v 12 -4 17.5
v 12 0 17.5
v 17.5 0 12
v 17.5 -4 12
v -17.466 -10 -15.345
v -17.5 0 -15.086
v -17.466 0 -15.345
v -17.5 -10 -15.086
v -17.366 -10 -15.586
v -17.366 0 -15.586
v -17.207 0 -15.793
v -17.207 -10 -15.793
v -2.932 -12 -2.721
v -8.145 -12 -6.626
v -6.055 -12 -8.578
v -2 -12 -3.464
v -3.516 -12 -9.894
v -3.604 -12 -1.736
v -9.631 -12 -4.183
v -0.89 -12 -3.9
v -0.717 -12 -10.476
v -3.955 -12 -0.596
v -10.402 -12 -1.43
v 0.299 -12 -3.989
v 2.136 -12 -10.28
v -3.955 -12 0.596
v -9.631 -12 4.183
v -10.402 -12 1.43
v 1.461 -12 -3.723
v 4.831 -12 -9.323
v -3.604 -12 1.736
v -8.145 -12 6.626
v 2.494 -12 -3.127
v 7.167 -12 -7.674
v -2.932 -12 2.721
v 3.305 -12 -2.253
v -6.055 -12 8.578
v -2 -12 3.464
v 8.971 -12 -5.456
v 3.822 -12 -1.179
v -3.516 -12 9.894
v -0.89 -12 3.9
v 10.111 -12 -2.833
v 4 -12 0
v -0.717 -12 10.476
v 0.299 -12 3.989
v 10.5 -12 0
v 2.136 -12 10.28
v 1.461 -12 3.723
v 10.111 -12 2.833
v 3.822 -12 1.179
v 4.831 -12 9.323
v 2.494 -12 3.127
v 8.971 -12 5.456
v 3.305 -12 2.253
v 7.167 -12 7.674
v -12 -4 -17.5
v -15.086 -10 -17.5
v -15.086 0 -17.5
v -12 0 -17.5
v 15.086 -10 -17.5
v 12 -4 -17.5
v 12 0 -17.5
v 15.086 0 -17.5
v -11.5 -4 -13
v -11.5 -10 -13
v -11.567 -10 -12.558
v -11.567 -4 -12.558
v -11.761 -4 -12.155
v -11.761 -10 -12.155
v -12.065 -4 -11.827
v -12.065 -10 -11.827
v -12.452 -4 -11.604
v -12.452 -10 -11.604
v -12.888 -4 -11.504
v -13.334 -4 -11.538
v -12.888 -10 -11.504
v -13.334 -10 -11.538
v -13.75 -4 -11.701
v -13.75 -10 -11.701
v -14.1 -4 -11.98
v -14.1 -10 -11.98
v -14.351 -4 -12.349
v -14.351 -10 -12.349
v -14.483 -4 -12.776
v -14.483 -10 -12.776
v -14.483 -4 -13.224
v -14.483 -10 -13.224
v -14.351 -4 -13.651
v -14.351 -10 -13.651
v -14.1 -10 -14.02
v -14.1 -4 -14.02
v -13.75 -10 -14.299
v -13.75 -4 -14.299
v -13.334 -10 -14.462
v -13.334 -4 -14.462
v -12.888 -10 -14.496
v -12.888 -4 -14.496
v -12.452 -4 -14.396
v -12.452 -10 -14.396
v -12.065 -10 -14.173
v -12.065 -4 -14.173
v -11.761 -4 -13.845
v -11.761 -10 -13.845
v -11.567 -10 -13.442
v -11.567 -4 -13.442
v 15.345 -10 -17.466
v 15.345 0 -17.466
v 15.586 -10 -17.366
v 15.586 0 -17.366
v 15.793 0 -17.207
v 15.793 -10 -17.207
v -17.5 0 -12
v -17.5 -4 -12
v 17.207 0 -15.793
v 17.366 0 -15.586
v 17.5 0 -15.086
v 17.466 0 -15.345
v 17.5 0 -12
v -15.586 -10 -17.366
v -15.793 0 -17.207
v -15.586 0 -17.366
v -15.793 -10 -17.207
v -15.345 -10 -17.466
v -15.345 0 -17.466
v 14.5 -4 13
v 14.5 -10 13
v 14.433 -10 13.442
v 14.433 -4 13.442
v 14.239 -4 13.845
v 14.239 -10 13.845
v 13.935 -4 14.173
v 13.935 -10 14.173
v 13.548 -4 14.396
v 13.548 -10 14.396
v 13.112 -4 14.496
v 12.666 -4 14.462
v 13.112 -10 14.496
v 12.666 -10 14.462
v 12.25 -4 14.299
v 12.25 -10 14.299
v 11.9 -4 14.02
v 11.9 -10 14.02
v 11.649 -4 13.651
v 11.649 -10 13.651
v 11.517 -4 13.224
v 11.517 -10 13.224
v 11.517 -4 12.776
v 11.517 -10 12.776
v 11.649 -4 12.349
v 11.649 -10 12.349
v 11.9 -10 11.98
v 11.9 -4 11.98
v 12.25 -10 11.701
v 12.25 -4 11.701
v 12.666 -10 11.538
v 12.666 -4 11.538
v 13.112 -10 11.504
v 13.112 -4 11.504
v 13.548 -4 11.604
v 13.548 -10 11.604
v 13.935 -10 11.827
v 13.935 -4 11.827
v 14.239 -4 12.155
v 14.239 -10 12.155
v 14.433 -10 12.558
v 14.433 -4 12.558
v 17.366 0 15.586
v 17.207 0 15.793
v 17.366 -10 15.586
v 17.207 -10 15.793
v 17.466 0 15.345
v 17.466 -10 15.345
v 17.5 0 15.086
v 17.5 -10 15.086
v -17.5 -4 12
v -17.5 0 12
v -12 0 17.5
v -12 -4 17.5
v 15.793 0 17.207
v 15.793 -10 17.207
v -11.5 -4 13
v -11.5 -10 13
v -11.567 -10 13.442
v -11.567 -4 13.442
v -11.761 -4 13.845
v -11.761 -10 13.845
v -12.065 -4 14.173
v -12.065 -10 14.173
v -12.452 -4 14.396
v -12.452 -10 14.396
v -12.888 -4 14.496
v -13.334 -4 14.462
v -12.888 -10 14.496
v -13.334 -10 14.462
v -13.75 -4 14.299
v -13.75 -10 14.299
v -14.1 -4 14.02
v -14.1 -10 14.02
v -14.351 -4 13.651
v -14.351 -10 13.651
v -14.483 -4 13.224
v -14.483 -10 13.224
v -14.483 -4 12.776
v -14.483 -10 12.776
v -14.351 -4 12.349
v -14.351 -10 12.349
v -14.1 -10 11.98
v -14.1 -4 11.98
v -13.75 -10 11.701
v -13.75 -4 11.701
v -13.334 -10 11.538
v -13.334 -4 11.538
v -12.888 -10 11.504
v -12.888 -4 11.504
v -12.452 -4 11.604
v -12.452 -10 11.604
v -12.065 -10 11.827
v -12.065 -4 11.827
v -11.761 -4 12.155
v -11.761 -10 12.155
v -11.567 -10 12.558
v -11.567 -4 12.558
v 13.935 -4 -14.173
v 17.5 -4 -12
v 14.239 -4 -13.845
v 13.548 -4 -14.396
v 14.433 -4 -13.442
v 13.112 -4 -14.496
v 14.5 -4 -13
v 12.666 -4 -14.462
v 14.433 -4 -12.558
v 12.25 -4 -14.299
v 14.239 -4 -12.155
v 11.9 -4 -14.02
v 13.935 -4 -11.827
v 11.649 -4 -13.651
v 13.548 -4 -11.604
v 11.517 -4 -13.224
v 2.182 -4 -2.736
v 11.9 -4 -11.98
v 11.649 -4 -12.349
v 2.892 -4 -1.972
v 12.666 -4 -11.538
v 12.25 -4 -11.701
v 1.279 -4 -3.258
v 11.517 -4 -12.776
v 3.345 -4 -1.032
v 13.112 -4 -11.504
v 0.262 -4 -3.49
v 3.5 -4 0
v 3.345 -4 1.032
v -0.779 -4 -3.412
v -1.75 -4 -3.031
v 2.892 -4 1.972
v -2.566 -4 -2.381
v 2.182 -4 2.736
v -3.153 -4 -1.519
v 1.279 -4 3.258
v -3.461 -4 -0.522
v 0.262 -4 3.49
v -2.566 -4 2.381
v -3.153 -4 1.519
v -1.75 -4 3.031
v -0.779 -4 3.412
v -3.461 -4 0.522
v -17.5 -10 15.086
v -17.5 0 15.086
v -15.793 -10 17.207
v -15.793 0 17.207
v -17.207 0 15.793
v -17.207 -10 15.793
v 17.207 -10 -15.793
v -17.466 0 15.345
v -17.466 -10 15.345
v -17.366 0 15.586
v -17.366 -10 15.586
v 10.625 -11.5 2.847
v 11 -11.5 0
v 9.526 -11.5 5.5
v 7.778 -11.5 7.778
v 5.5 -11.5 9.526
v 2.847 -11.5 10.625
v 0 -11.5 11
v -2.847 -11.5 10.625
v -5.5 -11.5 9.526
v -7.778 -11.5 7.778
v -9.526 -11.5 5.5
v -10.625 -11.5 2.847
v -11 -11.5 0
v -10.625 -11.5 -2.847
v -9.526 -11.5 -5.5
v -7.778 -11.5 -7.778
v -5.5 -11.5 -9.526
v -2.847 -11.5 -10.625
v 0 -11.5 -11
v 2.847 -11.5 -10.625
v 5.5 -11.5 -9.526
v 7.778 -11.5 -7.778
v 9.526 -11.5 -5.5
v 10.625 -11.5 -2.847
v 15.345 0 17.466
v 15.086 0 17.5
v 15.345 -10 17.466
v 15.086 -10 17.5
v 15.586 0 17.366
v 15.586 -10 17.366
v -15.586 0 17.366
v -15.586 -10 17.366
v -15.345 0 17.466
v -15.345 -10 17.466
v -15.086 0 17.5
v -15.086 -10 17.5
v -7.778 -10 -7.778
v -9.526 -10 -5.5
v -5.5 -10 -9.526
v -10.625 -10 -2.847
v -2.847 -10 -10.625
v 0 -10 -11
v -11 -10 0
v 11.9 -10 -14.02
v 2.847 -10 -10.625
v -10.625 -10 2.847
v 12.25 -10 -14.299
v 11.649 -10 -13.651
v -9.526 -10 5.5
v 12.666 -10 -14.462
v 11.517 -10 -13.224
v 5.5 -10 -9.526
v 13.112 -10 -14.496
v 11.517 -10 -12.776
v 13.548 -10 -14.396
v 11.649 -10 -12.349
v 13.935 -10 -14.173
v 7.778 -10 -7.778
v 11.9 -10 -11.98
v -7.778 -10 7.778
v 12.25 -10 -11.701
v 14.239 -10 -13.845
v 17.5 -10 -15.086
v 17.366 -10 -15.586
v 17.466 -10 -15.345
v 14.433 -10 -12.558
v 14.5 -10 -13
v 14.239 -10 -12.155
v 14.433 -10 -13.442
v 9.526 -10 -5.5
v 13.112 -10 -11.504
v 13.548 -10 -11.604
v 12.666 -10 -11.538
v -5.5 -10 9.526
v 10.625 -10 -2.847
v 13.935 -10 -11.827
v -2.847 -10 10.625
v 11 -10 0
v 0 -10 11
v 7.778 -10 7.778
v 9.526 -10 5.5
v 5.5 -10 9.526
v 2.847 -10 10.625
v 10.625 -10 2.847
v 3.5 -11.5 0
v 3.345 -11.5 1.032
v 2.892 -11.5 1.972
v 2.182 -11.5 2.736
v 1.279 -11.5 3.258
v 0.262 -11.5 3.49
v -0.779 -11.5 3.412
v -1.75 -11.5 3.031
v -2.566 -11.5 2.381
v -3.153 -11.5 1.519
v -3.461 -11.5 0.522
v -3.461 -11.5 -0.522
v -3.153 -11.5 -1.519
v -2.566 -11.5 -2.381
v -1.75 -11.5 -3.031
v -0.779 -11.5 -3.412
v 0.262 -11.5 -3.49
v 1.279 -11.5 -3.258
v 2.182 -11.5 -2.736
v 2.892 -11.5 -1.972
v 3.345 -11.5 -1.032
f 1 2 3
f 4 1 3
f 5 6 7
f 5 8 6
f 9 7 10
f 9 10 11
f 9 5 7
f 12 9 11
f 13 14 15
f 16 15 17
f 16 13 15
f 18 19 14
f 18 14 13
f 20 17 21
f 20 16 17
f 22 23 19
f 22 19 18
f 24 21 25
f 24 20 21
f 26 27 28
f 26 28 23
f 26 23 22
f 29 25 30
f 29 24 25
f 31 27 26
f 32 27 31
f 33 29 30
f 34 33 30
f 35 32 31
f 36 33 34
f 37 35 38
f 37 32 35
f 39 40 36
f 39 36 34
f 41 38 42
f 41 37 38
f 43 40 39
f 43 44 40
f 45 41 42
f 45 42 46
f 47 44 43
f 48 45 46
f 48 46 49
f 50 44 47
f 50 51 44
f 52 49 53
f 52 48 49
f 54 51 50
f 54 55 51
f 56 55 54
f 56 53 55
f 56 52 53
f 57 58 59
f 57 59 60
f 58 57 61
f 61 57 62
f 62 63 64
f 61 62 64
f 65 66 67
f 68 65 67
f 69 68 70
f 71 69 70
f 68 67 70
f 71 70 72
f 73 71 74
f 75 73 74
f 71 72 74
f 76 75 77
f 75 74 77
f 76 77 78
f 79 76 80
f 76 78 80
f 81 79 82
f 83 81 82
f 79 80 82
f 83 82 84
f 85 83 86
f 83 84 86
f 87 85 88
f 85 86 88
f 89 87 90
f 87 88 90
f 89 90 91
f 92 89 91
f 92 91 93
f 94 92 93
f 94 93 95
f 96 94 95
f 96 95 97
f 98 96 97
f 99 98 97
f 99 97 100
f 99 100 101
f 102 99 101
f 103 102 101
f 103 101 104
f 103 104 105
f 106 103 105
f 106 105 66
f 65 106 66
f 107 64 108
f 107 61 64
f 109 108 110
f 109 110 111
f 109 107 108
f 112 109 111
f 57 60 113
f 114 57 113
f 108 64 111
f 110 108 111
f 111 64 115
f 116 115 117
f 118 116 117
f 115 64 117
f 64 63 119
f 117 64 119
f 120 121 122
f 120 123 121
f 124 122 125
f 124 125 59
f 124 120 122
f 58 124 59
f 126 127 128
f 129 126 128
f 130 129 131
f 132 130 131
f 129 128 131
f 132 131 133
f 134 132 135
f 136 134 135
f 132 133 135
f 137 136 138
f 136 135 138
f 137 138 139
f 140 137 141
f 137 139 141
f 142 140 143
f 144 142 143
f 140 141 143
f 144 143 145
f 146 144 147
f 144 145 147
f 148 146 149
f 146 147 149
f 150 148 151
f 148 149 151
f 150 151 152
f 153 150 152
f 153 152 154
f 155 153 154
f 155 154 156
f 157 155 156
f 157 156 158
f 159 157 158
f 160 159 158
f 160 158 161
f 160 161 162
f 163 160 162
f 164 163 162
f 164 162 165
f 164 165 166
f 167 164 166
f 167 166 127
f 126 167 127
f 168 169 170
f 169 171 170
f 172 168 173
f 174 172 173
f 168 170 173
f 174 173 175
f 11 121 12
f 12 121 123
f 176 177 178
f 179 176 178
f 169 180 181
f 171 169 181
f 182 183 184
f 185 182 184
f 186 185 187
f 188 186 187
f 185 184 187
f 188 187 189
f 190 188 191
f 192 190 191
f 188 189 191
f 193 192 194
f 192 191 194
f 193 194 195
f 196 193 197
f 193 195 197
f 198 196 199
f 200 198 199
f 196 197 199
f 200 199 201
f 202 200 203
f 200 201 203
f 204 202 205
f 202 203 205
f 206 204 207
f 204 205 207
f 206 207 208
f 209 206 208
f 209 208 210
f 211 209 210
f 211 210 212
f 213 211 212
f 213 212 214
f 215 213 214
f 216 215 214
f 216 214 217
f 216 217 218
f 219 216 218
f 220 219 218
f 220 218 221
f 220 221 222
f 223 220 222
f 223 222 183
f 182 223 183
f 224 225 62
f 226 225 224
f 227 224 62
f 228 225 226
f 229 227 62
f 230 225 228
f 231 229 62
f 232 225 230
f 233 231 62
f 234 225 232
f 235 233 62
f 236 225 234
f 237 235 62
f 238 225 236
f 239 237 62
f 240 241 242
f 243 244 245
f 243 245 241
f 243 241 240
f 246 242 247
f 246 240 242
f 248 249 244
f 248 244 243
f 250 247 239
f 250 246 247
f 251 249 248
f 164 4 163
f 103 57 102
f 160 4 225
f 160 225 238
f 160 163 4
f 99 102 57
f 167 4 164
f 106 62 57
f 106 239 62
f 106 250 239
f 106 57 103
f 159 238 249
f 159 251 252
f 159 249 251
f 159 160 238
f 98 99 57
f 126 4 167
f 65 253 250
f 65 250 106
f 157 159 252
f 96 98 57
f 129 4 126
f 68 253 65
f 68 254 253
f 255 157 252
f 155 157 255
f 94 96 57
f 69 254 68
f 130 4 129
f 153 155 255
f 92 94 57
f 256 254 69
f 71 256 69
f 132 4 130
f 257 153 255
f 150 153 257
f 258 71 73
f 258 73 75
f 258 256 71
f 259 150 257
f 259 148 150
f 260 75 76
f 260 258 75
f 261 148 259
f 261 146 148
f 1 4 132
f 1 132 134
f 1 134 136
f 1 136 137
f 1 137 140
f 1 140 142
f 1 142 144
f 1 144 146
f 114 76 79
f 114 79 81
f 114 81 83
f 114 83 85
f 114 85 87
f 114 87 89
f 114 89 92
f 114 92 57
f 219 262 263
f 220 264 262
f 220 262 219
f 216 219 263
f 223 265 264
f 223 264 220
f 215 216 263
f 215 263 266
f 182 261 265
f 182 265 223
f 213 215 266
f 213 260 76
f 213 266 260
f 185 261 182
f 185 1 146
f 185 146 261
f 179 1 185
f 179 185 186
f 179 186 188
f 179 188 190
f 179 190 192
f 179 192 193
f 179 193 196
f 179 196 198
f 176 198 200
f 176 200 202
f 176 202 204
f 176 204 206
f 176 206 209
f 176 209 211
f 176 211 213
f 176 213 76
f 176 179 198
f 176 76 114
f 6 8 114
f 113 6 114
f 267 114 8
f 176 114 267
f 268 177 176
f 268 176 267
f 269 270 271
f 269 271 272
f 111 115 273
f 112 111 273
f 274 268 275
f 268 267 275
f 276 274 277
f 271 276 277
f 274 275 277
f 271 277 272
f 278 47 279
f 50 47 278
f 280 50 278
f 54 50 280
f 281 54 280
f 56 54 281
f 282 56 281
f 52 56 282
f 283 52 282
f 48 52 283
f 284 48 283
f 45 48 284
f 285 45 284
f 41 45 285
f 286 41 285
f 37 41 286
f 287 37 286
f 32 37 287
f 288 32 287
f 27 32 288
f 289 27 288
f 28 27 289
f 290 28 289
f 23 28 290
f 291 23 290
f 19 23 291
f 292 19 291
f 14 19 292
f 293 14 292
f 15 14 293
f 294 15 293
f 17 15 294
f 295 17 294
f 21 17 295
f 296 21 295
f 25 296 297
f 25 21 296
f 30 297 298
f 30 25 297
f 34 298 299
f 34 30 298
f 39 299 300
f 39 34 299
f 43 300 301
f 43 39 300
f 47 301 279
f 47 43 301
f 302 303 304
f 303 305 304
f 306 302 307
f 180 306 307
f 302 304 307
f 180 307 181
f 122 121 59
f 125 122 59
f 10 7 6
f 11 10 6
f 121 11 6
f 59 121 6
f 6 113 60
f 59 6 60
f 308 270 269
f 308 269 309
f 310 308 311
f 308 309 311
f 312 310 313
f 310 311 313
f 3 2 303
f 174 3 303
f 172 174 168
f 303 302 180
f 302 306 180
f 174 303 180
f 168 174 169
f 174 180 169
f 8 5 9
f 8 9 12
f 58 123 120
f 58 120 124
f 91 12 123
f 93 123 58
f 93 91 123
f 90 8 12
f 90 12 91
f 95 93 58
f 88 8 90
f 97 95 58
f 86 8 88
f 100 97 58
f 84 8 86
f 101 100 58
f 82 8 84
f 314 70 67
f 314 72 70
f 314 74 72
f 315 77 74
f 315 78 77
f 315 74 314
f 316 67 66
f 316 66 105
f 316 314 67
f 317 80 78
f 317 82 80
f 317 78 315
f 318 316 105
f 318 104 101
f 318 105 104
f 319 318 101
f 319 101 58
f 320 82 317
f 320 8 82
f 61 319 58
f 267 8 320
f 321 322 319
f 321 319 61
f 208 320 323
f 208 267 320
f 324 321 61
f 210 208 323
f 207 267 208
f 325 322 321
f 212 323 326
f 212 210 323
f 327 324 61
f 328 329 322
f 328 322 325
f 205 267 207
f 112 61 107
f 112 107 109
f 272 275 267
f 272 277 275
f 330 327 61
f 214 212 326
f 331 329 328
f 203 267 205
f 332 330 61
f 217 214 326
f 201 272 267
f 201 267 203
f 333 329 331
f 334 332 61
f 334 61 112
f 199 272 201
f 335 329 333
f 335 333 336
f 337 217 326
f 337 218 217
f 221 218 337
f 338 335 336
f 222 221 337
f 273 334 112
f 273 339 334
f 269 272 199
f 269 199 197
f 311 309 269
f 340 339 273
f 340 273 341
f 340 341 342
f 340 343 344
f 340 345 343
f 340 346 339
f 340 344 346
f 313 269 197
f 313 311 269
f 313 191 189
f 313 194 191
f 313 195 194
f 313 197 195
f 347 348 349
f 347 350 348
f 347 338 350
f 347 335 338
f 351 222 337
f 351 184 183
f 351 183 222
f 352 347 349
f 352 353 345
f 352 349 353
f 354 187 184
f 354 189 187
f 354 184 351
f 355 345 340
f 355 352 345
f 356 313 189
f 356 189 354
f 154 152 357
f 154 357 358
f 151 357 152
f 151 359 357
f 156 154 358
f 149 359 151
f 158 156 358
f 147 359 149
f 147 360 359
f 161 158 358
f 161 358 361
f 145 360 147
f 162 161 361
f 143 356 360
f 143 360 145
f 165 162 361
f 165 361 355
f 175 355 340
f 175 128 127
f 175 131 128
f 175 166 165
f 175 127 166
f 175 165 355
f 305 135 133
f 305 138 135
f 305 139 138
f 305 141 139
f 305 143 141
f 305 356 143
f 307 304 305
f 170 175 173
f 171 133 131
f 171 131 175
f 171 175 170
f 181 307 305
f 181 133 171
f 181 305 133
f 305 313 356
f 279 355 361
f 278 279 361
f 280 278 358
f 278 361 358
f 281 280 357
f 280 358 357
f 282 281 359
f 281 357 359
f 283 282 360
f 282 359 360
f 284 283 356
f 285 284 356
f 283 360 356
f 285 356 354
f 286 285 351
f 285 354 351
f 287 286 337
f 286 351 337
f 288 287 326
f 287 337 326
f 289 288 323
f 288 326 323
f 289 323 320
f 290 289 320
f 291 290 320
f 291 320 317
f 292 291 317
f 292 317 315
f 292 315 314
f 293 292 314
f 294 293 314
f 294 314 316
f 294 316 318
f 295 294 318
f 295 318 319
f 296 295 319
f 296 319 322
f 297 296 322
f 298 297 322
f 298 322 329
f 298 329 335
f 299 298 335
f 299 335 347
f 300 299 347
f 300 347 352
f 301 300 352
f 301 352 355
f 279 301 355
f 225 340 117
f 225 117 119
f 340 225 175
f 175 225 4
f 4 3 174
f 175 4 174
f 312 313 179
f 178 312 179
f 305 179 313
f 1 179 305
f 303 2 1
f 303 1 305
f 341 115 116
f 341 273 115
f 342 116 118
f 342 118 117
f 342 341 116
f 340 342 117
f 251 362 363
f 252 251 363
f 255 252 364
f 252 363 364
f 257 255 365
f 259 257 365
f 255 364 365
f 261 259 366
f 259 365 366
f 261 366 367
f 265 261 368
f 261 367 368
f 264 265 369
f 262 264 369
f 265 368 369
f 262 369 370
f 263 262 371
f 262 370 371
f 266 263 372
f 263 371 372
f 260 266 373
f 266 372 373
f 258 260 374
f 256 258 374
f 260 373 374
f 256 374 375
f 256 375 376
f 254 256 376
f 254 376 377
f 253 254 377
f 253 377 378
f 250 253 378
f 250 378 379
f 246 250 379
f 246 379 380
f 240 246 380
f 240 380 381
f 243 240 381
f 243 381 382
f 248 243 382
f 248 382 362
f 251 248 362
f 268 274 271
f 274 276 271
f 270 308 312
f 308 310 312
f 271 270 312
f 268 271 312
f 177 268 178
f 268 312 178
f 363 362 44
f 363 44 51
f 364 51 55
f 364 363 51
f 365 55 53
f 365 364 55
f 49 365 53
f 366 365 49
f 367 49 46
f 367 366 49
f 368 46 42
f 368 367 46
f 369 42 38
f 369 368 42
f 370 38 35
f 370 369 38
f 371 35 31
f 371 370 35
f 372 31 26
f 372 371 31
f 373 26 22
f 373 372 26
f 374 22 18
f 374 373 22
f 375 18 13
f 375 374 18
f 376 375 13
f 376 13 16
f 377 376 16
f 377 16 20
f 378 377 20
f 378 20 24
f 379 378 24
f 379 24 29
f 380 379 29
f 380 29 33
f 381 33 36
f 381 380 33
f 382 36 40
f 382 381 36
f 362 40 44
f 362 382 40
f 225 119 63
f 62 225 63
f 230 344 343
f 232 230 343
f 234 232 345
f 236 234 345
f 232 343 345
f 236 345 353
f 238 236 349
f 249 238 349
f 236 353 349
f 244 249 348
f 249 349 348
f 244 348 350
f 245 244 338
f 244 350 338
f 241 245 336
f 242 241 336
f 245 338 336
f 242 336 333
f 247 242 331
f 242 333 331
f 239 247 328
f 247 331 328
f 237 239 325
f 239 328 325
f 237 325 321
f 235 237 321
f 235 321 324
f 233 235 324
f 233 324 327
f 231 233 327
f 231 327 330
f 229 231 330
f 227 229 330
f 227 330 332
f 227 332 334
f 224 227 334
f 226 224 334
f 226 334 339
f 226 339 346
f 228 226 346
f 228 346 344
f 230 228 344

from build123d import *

# Parameters (mm, degrees)
F0_W      = 35
F0_H      = 35
F1_DEPTH  = 10
F2_SIZE   = 2
F3_R      = 11
F4_DEPTH  = 0.5
F5_R      = 11
F6_DEPTH  = 2.5
F7_R      = 3.5
F8_DEPTH  = 12.001
F9_R      = 1
F10_SIZE  = 0.5
F11_R     = 1.5
F12_DEPTH = 10.001
F14_DEPTH = 4


with BuildPart() as f1:
    # F0 (on Front) → F1 (new body)
    with BuildSketch(Plane.XZ):
        Rectangle(F0_W, F0_H)
    extrude(amount=F1_DEPTH)

    # F2
    f2_edges = [f1.edges().sort_by_distance(p)[0] for p in [
        (-17.5, -5, 17.5),
        (17.5, -5, 17.5),
        (17.5, -5, -17.5),
        (-17.5, -5, -17.5),
    ]]
    chamfer(f2_edges, length=F2_SIZE)

    # F3 (on face) → F4 (cut)
    with BuildSketch(Plane.XZ.offset(10)):
        Circle(F3_R)
    extrude(amount=-F4_DEPTH, mode=Mode.SUBTRACT)

    # F5 (on face) → F6 (join)
    with BuildSketch(Plane.XZ.offset(9.5)):
        Circle(F5_R)
    extrude(amount=F6_DEPTH)

    # F7 (on face) → F8 (cut, through all)
    with BuildSketch(Plane.XZ.offset(12)):
        Circle(F7_R)
    extrude(amount=-F8_DEPTH, mode=Mode.SUBTRACT)

    # F9
    f9_edges = [f1.edges().sort_by_distance(p)[0] for p in [
        (-15.5, -5, 17.5),
        (15.5, -5, 17.5),
        (17.5, -5, 15.5),
        (17.5, -5, -15.5),
        (15.5, -5, -17.5),
        (-15.5, -5, -17.5),
        (-17.5, -5, -15.5),
        (-17.5, -5, 15.5),
    ]]
    fillet(f9_edges, radius=F9_R)

    # F10
    f10_edges = [f1.edges().sort_by_distance(p)[0] for p in [
        (-11, -12, 0),
        (-3.5, -12, 0),
    ]]
    chamfer(f10_edges, length=F10_SIZE)

    # F11 (on face) → F12 (cut, through all)
    with BuildSketch(Plane.XZ.offset(10)):
        with Locations((-13, 13)):
            Circle(F11_R)
        with Locations((-13, -13)):
            Circle(F11_R)
        with Locations((13, -13)):
            Circle(F11_R)
        with Locations((13, 13)):
            Circle(F11_R)
    extrude(amount=-F12_DEPTH, mode=Mode.SUBTRACT)

    # F13 (on face) → F14 (cut)
    with BuildSketch(Plane(origin=(0, 0, 0), x_dir=(-1, 0, 0), z_dir=(0, 1, 0))):
        Polygon((12, 17.5), (-12, 17.5), (-17.5, 12), (-17.5, -12), (-12, -17.5), (12, -17.5), (17.5, -12), (17.5, 12), align=None)
    extrude(amount=-F14_DEPTH, mode=Mode.SUBTRACT)


solid = f1.part
